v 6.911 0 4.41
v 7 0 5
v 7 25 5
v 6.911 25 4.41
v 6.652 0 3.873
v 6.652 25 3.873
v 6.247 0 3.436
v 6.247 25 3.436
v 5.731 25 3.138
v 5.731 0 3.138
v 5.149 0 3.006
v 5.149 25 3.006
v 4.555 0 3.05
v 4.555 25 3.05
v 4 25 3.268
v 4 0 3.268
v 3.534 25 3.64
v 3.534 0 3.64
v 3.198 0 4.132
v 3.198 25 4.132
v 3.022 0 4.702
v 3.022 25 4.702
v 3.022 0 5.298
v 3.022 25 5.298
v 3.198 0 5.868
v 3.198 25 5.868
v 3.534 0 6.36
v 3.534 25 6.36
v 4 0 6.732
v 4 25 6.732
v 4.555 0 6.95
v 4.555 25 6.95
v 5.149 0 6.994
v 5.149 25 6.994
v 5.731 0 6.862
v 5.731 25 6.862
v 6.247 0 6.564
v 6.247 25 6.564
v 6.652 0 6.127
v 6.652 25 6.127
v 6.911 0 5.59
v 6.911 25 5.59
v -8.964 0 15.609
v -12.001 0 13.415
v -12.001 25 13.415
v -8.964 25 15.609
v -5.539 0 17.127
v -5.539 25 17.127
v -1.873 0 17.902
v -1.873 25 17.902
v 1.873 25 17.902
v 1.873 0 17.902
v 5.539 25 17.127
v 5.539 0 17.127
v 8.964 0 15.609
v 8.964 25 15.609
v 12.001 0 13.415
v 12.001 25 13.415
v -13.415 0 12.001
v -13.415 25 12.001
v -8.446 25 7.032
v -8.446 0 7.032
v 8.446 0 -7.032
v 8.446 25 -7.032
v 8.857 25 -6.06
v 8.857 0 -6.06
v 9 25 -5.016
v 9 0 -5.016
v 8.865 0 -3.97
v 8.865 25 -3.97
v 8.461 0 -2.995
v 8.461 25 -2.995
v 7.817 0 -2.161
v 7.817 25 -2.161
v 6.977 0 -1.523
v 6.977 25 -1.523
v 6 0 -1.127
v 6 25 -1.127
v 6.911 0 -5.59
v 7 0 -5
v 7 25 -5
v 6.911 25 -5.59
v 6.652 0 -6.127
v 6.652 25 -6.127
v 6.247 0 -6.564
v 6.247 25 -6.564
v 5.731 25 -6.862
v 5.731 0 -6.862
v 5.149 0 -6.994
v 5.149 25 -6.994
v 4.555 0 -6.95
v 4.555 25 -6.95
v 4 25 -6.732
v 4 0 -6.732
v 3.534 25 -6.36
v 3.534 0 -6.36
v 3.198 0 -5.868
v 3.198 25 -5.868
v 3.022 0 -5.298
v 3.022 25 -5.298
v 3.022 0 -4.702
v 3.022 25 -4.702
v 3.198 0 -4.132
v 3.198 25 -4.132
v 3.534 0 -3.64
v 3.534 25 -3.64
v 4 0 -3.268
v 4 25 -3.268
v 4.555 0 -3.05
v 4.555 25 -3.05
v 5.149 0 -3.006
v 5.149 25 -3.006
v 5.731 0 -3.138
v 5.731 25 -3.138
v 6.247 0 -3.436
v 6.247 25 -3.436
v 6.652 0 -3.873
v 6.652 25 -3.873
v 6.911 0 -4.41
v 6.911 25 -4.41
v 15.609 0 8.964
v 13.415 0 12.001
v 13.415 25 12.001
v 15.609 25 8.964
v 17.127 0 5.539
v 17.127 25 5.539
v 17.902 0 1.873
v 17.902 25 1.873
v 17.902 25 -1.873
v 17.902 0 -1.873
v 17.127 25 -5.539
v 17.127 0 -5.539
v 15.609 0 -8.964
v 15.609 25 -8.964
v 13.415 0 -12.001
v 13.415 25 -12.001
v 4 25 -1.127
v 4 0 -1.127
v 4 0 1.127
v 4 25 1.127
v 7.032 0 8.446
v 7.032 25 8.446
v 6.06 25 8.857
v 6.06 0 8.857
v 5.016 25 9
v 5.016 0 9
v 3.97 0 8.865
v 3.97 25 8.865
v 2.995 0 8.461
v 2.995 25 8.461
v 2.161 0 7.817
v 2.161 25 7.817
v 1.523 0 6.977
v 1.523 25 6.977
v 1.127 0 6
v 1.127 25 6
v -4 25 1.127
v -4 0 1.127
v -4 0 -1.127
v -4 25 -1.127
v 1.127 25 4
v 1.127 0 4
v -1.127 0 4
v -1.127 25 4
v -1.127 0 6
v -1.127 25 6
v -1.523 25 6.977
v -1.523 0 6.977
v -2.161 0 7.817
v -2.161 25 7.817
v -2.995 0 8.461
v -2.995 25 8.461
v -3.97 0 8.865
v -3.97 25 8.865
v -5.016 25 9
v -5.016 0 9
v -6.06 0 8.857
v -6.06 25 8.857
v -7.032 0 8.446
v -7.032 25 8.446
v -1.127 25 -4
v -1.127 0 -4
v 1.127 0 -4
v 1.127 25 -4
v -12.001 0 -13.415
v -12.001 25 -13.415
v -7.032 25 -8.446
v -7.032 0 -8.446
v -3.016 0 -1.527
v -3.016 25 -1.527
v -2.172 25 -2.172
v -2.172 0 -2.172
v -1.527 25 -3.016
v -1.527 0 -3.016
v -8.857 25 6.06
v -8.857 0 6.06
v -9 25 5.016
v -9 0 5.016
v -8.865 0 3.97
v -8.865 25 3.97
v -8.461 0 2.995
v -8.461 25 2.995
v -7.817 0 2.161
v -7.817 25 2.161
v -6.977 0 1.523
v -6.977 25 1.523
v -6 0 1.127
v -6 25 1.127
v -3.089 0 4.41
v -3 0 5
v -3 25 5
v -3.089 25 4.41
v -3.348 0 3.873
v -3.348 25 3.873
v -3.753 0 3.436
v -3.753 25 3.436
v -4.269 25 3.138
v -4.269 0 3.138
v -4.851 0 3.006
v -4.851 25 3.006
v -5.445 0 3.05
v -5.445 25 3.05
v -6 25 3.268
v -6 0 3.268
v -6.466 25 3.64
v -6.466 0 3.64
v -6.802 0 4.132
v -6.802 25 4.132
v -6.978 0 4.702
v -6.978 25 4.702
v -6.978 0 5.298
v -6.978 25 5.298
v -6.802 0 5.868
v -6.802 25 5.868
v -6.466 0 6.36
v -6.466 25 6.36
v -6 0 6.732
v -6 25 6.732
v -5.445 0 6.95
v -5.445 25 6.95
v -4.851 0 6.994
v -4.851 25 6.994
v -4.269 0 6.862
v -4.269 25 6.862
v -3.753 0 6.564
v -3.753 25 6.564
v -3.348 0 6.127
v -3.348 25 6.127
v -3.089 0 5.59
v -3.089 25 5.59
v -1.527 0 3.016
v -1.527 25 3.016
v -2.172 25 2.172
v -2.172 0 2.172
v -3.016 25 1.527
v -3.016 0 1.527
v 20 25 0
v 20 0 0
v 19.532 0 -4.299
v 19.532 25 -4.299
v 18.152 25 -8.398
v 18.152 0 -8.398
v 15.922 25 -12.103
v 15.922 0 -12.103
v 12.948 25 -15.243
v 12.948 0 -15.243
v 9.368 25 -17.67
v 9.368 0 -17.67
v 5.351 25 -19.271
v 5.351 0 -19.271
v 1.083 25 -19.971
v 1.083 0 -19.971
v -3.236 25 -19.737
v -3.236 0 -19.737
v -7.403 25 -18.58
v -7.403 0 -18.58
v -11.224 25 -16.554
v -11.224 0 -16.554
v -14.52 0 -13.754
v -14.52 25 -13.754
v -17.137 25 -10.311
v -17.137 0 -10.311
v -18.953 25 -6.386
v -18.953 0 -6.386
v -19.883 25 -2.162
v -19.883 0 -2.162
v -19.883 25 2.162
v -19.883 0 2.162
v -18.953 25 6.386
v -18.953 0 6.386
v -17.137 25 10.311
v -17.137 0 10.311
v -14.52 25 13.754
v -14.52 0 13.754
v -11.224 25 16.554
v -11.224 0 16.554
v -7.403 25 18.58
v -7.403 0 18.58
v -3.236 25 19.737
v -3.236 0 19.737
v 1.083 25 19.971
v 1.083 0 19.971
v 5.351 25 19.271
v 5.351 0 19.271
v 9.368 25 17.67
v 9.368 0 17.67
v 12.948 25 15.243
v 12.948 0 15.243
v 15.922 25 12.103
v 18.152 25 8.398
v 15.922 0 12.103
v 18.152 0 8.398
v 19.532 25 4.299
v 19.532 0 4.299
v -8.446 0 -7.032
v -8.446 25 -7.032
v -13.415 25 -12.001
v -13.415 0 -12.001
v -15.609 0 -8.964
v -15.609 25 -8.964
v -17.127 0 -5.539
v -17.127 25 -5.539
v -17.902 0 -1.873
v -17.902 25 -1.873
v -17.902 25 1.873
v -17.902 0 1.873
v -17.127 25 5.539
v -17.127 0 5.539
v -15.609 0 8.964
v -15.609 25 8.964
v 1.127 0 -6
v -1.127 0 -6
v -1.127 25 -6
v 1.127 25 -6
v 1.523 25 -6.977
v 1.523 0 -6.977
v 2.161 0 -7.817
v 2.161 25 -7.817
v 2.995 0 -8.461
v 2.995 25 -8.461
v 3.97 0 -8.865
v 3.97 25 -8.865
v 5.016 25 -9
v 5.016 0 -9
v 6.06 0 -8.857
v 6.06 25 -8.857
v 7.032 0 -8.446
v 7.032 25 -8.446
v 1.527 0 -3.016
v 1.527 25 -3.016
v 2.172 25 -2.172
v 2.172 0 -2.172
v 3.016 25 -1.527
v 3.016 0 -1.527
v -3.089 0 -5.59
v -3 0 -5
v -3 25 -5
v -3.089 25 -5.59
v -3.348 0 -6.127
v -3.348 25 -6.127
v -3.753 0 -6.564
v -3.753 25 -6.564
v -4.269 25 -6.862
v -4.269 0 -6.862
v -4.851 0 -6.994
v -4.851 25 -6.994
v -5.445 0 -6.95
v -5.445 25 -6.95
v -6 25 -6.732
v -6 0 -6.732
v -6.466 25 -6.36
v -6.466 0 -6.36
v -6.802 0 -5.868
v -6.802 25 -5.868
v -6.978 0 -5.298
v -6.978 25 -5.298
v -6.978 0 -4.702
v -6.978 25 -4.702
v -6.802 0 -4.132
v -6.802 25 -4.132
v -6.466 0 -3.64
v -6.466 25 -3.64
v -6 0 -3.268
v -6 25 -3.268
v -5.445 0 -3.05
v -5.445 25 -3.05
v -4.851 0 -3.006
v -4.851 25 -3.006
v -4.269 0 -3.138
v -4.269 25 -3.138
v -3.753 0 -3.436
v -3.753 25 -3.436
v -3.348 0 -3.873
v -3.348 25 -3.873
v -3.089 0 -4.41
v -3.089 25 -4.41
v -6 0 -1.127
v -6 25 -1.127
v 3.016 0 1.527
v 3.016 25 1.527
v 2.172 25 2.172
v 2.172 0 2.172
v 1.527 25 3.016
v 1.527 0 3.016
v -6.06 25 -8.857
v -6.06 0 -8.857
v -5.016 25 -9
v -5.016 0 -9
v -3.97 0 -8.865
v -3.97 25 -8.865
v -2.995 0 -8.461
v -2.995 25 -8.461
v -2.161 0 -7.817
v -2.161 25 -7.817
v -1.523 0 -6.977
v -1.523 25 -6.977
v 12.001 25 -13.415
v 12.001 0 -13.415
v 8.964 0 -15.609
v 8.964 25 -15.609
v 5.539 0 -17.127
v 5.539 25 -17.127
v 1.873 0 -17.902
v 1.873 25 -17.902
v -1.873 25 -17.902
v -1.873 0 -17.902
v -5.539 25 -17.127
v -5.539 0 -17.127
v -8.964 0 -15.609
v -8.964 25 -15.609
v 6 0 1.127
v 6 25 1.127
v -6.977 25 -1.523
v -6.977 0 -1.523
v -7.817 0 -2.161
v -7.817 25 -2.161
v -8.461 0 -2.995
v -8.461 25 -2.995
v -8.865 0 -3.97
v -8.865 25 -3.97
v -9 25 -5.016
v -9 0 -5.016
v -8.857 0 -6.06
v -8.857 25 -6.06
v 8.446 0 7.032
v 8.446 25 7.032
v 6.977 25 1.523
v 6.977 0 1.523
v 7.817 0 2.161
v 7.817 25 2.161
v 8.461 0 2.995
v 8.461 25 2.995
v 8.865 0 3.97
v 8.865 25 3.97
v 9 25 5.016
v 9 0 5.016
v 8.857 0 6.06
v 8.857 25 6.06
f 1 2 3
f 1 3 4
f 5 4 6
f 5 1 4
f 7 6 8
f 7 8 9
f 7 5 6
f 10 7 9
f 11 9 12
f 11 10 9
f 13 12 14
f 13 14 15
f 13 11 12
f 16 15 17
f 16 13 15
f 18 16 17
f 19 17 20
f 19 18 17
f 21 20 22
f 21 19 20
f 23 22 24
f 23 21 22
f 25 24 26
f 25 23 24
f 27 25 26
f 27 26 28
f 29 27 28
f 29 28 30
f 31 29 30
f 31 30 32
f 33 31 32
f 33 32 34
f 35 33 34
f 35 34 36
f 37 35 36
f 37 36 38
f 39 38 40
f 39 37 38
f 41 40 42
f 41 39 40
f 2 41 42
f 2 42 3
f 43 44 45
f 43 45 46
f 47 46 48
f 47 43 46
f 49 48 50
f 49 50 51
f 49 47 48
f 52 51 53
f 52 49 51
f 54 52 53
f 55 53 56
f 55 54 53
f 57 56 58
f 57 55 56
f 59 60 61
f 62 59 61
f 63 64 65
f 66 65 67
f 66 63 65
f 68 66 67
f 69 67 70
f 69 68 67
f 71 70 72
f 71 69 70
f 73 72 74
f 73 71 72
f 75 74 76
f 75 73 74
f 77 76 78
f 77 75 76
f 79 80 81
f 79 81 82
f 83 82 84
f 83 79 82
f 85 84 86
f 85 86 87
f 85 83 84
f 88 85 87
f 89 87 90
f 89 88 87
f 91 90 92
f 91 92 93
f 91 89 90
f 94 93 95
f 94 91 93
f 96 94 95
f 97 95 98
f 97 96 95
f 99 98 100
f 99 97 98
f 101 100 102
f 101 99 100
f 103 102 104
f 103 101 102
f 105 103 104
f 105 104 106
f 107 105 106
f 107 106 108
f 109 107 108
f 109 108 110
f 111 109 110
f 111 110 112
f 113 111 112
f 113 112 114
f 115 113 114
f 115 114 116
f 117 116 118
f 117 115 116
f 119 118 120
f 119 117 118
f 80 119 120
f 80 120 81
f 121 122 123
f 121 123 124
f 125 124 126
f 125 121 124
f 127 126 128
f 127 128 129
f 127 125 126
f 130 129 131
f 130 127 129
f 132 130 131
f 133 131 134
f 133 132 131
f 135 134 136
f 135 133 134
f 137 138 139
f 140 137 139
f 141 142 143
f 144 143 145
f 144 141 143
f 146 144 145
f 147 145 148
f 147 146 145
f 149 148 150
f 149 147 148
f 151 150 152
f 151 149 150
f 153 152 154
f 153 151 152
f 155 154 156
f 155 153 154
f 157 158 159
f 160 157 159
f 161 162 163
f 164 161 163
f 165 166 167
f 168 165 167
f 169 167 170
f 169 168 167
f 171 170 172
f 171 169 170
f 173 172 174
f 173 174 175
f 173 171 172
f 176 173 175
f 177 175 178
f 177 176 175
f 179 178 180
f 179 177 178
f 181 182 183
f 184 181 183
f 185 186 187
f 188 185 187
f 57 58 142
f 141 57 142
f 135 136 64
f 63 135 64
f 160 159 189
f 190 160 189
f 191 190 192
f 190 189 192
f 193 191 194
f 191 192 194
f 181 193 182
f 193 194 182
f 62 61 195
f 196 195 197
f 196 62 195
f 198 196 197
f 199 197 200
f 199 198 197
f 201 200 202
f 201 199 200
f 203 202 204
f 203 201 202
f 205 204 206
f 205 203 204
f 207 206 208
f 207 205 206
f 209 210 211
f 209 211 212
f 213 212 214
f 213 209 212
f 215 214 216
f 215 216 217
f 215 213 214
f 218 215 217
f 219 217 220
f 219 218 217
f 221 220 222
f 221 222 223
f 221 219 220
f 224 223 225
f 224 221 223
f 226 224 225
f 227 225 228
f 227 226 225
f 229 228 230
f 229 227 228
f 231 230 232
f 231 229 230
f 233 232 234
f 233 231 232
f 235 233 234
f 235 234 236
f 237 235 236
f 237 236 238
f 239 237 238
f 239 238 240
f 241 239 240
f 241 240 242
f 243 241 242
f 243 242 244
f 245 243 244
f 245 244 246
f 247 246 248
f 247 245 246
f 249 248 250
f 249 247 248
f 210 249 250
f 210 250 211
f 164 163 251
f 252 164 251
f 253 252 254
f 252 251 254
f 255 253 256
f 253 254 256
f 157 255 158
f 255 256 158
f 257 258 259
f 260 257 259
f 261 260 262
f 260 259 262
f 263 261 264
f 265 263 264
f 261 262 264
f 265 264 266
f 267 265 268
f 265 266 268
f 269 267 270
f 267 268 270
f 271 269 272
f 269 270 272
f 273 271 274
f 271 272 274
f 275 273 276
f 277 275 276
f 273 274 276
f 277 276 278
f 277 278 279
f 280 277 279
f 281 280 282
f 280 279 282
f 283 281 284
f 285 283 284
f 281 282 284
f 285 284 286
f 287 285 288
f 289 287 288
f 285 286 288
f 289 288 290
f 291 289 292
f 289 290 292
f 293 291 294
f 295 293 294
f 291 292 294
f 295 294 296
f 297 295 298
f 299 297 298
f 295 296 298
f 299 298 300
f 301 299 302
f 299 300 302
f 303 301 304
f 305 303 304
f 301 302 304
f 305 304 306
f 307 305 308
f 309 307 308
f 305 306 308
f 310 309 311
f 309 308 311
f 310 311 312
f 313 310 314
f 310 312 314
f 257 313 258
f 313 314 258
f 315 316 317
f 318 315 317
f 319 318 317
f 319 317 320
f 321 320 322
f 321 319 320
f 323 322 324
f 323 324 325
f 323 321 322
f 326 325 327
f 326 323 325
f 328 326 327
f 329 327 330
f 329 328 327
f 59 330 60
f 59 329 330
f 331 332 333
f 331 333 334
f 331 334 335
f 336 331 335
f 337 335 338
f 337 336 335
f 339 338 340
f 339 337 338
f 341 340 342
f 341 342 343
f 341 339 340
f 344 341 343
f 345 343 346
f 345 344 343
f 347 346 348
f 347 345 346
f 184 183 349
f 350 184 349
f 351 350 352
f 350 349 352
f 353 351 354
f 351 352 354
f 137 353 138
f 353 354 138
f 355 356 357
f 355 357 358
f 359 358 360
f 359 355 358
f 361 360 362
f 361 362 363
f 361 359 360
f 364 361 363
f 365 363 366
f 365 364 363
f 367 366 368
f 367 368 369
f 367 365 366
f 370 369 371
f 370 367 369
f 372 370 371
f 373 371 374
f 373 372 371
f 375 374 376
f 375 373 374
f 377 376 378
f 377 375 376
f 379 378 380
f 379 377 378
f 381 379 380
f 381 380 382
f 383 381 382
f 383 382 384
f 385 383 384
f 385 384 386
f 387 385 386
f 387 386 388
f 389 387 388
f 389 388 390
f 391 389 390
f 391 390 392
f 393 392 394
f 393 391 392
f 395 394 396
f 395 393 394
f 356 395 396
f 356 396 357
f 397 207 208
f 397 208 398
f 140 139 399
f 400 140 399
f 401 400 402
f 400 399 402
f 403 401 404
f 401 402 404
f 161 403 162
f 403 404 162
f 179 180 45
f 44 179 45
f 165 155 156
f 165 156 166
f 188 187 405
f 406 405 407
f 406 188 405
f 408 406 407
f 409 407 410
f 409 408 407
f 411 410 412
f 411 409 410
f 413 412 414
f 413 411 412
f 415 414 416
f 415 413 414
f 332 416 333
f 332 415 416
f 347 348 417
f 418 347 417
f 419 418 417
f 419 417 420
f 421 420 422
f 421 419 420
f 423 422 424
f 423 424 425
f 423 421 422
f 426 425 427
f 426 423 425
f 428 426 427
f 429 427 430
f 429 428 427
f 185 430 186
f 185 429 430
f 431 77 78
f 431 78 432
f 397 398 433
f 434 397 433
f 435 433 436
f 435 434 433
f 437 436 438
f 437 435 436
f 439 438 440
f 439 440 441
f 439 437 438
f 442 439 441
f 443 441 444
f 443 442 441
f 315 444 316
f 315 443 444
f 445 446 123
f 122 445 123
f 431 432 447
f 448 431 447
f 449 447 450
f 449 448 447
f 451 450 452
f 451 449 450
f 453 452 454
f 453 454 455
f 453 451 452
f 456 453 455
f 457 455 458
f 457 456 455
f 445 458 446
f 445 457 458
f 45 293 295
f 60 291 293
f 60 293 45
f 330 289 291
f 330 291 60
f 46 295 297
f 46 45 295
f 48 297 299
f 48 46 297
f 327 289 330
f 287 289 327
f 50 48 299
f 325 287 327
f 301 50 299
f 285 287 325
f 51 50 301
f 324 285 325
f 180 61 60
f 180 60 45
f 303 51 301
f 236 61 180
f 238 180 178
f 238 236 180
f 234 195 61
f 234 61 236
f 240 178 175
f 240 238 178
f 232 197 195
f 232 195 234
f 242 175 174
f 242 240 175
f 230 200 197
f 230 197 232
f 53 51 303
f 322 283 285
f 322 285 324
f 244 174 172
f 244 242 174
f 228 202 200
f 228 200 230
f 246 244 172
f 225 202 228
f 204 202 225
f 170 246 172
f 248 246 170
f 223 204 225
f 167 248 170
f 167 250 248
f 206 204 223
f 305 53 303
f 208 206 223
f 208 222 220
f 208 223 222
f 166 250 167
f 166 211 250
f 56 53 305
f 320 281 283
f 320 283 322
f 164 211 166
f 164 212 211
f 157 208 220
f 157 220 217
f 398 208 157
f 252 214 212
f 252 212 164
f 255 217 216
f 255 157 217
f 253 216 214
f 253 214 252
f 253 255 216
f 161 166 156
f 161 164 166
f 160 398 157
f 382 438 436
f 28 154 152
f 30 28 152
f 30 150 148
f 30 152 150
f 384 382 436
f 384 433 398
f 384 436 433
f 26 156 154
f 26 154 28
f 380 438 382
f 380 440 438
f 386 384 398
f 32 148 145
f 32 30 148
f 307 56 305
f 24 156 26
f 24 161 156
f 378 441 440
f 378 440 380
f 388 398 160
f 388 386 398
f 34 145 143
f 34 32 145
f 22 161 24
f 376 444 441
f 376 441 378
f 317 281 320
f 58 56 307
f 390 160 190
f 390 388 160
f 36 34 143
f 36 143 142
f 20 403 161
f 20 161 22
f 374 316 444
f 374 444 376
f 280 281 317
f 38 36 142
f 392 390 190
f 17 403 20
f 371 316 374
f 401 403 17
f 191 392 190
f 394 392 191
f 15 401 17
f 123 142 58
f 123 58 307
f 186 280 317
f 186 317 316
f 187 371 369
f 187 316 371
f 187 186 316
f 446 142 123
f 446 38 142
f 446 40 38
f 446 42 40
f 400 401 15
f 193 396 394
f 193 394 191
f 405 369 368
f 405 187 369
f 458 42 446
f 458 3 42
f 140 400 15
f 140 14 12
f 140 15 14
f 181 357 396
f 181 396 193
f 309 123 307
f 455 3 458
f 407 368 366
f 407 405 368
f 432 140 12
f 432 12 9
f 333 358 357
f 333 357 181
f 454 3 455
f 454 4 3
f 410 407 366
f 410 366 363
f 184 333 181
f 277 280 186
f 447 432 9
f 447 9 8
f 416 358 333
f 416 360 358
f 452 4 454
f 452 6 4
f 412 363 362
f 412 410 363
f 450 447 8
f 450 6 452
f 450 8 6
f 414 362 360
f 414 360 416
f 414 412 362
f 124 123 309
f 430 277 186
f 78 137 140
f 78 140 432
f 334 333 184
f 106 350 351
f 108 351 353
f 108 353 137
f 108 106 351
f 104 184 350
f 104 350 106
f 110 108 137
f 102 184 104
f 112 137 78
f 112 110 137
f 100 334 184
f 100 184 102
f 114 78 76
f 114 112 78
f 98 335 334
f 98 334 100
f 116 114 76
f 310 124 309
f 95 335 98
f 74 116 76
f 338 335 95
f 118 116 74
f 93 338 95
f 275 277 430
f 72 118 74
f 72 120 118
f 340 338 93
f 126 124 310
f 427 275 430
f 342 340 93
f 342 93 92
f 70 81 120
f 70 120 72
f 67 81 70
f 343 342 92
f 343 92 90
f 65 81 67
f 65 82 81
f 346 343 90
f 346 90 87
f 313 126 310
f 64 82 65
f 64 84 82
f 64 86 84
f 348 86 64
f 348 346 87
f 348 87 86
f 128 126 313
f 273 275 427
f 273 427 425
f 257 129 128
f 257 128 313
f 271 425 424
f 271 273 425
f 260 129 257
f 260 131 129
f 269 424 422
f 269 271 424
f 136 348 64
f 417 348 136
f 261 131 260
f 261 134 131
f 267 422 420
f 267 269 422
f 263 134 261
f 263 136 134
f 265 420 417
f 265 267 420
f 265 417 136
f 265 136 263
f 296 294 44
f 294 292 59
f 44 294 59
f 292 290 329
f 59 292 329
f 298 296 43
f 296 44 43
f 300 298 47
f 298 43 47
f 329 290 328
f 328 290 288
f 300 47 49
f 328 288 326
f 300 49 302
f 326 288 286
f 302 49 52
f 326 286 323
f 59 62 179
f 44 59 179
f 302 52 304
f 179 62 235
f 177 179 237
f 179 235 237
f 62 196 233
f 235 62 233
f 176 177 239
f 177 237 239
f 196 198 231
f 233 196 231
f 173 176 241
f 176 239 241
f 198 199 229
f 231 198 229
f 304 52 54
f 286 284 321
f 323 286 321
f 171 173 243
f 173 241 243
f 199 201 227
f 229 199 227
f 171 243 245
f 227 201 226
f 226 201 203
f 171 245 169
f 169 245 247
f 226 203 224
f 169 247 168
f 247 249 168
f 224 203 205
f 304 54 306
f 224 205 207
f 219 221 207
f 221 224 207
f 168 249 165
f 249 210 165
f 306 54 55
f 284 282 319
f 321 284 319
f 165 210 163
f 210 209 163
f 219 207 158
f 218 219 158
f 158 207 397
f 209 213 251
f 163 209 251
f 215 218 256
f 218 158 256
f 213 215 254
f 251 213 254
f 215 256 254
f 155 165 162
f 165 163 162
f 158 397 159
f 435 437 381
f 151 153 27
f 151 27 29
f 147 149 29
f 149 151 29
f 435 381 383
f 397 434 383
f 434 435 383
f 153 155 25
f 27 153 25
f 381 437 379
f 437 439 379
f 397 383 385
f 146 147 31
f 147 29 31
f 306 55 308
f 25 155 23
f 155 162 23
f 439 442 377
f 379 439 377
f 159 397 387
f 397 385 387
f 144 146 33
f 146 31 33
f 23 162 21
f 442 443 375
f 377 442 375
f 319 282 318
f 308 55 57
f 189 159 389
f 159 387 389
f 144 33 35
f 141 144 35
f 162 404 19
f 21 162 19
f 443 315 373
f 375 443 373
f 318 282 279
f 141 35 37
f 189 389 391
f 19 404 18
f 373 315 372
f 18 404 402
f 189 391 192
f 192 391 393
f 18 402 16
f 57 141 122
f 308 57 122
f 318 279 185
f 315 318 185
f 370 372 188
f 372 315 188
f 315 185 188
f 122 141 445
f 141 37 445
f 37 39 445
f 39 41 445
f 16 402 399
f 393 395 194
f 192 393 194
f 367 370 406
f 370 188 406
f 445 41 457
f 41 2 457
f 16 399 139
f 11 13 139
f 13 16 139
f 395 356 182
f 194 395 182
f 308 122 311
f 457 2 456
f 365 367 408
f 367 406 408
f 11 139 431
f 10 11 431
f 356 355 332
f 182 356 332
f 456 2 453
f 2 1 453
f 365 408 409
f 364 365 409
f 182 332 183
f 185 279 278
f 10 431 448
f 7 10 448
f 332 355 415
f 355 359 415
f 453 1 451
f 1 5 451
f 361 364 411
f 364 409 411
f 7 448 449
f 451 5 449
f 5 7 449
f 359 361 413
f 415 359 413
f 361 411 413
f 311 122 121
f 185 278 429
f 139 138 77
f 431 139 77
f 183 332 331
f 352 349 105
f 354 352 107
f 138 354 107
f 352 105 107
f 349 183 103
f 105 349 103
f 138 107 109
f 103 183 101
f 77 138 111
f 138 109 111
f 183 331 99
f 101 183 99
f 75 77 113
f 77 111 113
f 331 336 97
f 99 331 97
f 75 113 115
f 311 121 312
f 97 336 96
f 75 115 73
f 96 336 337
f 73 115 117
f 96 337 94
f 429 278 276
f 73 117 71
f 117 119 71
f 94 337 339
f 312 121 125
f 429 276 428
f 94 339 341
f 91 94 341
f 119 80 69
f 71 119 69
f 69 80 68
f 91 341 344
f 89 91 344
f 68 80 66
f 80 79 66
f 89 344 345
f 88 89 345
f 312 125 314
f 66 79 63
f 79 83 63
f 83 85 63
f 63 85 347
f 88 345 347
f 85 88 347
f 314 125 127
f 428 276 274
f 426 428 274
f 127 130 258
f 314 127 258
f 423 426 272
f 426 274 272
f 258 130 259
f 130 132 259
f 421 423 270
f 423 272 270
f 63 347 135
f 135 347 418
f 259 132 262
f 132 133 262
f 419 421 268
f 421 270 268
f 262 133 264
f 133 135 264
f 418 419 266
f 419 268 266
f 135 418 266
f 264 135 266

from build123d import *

# Parameters (mm, degrees)
SKETCH_2_R      = 20
SKETCH_2_R_2    = 2
EXTRUDE_1_DEPTH = 25


with BuildPart() as part:
    # 草图2 → 凸台-拉伸1 (new body)
    with BuildSketch(Plane(origin=(0, 0, 0), x_dir=(1, 0, 0), z_dir=(0, 1, 0))):
        Circle(SKETCH_2_R)
        with Locations((-5, 5)):
            Circle(SKETCH_2_R_2, mode=Mode.SUBTRACT)
        with Locations((5, 5)):
            Circle(SKETCH_2_R_2, mode=Mode.SUBTRACT)
        with Locations((5, -5)):
            Circle(SKETCH_2_R_2, mode=Mode.SUBTRACT)
        with Locations((-5, -5)):
            Circle(SKETCH_2_R_2, mode=Mode.SUBTRACT)
        with BuildLine():
            Line((-8.445719569, 7.031506006), (-13.415371808, 12.001158246))
            ThreePointArc((-13.415371808, 12.001158246), (-18, 0), (-13.415371808, -12.001158246))
            Line((-13.415371808, -12.001158246), (-8.445719569, -7.031506006))
            ThreePointArc((-8.445719569, -7.031506006), (-8.69551813, -3.469266271), (-6, -1.127016654))
            Line((-6, -1.127016654), (-6, 1.127016654))
            ThreePointArc((-6, 1.127016654), (-8.69551813, 3.469266271), (-8.445719569, 7.031506006))
        make_face(mode=Mode.SUBTRACT)
        with BuildLine():
            Line((-12.001158246, 13.415371808), (-7.031506006, 8.445719569))
            ThreePointArc((-7.031506006, 8.445719569), (-3.469266271, 8.69551813), (-1.127016654, 6))
            Line((-1.127016654, 6), (1.127016654, 6))
            ThreePointArc((1.127016654, 6), (3.469266271, 8.69551813), (7.031506006, 8.445719569))
            Line((7.031506006, 8.445719569), (12.001158246, 13.415371808))
            ThreePointArc((12.001158246, 13.415371808), (0, 18), (-12.001158246, 13.415371808))
        make_face(mode=Mode.SUBTRACT)
        with BuildLine():
            Line((13.415371808, 12.001158246), (8.445719569, 7.031506006))
            ThreePointArc((8.445719569, 7.031506006), (8.69551813, 3.469266271), (6, 1.127016654))
            Line((6, 1.127016654), (6, -1.127016654))
            ThreePointArc((6, -1.127016654), (8.69551813, -3.469266271), (8.445719569, -7.031506006))
            Line((8.445719569, -7.031506006), (13.415371808, -12.001158246))
            ThreePointArc((13.415371808, -12.001158246), (18, 0), (13.415371808, 12.001158246))
        make_face(mode=Mode.SUBTRACT)
        with BuildLine():
            Line((12.001158246, -13.415371808), (7.031506006, -8.445719569))
            ThreePointArc((7.031506006, -8.445719569), (3.469266271, -8.69551813), (1.127016654, -6))
            Line((1.127016654, -6), (-1.127016654, -6))
            ThreePointArc((-1.127016654, -6), (-3.469266271, -8.69551813), (-7.031506006, -8.445719569))
            Line((-7.031506006, -8.445719569), (-12.001158246, -13.415371808))
            ThreePointArc((-12.001158246, -13.415371808), (0, -18), (12.001158246, -13.415371808))
        make_face(mode=Mode.SUBTRACT)
        with BuildLine():
            Line((-1.127016654, 4), (1.127016654, 4))
            ThreePointArc((1.127016654, 4), (2.171572875, 2.171572875), (4, 1.127016654))
            Line((4, 1.127016654), (4, -1.127016654))
            ThreePointArc((4, -1.127016654), (2.171572875, -2.171572875), (1.127016654, -4))
            Line((1.127016654, -4), (-1.127016654, -4))
            ThreePointArc((-1.127016654, -4), (-2.171572875, -2.171572875), (-4, -1.127016654))
            Line((-4, -1.127016654), (-4, 1.127016654))
            ThreePointArc((-4, 1.127016654), (-2.171572875, 2.171572875), (-1.127016654, 4))
        make_face(mode=Mode.SUBTRACT)
    extrude(amount=EXTRUDE_1_DEPTH)


solid = part.part
